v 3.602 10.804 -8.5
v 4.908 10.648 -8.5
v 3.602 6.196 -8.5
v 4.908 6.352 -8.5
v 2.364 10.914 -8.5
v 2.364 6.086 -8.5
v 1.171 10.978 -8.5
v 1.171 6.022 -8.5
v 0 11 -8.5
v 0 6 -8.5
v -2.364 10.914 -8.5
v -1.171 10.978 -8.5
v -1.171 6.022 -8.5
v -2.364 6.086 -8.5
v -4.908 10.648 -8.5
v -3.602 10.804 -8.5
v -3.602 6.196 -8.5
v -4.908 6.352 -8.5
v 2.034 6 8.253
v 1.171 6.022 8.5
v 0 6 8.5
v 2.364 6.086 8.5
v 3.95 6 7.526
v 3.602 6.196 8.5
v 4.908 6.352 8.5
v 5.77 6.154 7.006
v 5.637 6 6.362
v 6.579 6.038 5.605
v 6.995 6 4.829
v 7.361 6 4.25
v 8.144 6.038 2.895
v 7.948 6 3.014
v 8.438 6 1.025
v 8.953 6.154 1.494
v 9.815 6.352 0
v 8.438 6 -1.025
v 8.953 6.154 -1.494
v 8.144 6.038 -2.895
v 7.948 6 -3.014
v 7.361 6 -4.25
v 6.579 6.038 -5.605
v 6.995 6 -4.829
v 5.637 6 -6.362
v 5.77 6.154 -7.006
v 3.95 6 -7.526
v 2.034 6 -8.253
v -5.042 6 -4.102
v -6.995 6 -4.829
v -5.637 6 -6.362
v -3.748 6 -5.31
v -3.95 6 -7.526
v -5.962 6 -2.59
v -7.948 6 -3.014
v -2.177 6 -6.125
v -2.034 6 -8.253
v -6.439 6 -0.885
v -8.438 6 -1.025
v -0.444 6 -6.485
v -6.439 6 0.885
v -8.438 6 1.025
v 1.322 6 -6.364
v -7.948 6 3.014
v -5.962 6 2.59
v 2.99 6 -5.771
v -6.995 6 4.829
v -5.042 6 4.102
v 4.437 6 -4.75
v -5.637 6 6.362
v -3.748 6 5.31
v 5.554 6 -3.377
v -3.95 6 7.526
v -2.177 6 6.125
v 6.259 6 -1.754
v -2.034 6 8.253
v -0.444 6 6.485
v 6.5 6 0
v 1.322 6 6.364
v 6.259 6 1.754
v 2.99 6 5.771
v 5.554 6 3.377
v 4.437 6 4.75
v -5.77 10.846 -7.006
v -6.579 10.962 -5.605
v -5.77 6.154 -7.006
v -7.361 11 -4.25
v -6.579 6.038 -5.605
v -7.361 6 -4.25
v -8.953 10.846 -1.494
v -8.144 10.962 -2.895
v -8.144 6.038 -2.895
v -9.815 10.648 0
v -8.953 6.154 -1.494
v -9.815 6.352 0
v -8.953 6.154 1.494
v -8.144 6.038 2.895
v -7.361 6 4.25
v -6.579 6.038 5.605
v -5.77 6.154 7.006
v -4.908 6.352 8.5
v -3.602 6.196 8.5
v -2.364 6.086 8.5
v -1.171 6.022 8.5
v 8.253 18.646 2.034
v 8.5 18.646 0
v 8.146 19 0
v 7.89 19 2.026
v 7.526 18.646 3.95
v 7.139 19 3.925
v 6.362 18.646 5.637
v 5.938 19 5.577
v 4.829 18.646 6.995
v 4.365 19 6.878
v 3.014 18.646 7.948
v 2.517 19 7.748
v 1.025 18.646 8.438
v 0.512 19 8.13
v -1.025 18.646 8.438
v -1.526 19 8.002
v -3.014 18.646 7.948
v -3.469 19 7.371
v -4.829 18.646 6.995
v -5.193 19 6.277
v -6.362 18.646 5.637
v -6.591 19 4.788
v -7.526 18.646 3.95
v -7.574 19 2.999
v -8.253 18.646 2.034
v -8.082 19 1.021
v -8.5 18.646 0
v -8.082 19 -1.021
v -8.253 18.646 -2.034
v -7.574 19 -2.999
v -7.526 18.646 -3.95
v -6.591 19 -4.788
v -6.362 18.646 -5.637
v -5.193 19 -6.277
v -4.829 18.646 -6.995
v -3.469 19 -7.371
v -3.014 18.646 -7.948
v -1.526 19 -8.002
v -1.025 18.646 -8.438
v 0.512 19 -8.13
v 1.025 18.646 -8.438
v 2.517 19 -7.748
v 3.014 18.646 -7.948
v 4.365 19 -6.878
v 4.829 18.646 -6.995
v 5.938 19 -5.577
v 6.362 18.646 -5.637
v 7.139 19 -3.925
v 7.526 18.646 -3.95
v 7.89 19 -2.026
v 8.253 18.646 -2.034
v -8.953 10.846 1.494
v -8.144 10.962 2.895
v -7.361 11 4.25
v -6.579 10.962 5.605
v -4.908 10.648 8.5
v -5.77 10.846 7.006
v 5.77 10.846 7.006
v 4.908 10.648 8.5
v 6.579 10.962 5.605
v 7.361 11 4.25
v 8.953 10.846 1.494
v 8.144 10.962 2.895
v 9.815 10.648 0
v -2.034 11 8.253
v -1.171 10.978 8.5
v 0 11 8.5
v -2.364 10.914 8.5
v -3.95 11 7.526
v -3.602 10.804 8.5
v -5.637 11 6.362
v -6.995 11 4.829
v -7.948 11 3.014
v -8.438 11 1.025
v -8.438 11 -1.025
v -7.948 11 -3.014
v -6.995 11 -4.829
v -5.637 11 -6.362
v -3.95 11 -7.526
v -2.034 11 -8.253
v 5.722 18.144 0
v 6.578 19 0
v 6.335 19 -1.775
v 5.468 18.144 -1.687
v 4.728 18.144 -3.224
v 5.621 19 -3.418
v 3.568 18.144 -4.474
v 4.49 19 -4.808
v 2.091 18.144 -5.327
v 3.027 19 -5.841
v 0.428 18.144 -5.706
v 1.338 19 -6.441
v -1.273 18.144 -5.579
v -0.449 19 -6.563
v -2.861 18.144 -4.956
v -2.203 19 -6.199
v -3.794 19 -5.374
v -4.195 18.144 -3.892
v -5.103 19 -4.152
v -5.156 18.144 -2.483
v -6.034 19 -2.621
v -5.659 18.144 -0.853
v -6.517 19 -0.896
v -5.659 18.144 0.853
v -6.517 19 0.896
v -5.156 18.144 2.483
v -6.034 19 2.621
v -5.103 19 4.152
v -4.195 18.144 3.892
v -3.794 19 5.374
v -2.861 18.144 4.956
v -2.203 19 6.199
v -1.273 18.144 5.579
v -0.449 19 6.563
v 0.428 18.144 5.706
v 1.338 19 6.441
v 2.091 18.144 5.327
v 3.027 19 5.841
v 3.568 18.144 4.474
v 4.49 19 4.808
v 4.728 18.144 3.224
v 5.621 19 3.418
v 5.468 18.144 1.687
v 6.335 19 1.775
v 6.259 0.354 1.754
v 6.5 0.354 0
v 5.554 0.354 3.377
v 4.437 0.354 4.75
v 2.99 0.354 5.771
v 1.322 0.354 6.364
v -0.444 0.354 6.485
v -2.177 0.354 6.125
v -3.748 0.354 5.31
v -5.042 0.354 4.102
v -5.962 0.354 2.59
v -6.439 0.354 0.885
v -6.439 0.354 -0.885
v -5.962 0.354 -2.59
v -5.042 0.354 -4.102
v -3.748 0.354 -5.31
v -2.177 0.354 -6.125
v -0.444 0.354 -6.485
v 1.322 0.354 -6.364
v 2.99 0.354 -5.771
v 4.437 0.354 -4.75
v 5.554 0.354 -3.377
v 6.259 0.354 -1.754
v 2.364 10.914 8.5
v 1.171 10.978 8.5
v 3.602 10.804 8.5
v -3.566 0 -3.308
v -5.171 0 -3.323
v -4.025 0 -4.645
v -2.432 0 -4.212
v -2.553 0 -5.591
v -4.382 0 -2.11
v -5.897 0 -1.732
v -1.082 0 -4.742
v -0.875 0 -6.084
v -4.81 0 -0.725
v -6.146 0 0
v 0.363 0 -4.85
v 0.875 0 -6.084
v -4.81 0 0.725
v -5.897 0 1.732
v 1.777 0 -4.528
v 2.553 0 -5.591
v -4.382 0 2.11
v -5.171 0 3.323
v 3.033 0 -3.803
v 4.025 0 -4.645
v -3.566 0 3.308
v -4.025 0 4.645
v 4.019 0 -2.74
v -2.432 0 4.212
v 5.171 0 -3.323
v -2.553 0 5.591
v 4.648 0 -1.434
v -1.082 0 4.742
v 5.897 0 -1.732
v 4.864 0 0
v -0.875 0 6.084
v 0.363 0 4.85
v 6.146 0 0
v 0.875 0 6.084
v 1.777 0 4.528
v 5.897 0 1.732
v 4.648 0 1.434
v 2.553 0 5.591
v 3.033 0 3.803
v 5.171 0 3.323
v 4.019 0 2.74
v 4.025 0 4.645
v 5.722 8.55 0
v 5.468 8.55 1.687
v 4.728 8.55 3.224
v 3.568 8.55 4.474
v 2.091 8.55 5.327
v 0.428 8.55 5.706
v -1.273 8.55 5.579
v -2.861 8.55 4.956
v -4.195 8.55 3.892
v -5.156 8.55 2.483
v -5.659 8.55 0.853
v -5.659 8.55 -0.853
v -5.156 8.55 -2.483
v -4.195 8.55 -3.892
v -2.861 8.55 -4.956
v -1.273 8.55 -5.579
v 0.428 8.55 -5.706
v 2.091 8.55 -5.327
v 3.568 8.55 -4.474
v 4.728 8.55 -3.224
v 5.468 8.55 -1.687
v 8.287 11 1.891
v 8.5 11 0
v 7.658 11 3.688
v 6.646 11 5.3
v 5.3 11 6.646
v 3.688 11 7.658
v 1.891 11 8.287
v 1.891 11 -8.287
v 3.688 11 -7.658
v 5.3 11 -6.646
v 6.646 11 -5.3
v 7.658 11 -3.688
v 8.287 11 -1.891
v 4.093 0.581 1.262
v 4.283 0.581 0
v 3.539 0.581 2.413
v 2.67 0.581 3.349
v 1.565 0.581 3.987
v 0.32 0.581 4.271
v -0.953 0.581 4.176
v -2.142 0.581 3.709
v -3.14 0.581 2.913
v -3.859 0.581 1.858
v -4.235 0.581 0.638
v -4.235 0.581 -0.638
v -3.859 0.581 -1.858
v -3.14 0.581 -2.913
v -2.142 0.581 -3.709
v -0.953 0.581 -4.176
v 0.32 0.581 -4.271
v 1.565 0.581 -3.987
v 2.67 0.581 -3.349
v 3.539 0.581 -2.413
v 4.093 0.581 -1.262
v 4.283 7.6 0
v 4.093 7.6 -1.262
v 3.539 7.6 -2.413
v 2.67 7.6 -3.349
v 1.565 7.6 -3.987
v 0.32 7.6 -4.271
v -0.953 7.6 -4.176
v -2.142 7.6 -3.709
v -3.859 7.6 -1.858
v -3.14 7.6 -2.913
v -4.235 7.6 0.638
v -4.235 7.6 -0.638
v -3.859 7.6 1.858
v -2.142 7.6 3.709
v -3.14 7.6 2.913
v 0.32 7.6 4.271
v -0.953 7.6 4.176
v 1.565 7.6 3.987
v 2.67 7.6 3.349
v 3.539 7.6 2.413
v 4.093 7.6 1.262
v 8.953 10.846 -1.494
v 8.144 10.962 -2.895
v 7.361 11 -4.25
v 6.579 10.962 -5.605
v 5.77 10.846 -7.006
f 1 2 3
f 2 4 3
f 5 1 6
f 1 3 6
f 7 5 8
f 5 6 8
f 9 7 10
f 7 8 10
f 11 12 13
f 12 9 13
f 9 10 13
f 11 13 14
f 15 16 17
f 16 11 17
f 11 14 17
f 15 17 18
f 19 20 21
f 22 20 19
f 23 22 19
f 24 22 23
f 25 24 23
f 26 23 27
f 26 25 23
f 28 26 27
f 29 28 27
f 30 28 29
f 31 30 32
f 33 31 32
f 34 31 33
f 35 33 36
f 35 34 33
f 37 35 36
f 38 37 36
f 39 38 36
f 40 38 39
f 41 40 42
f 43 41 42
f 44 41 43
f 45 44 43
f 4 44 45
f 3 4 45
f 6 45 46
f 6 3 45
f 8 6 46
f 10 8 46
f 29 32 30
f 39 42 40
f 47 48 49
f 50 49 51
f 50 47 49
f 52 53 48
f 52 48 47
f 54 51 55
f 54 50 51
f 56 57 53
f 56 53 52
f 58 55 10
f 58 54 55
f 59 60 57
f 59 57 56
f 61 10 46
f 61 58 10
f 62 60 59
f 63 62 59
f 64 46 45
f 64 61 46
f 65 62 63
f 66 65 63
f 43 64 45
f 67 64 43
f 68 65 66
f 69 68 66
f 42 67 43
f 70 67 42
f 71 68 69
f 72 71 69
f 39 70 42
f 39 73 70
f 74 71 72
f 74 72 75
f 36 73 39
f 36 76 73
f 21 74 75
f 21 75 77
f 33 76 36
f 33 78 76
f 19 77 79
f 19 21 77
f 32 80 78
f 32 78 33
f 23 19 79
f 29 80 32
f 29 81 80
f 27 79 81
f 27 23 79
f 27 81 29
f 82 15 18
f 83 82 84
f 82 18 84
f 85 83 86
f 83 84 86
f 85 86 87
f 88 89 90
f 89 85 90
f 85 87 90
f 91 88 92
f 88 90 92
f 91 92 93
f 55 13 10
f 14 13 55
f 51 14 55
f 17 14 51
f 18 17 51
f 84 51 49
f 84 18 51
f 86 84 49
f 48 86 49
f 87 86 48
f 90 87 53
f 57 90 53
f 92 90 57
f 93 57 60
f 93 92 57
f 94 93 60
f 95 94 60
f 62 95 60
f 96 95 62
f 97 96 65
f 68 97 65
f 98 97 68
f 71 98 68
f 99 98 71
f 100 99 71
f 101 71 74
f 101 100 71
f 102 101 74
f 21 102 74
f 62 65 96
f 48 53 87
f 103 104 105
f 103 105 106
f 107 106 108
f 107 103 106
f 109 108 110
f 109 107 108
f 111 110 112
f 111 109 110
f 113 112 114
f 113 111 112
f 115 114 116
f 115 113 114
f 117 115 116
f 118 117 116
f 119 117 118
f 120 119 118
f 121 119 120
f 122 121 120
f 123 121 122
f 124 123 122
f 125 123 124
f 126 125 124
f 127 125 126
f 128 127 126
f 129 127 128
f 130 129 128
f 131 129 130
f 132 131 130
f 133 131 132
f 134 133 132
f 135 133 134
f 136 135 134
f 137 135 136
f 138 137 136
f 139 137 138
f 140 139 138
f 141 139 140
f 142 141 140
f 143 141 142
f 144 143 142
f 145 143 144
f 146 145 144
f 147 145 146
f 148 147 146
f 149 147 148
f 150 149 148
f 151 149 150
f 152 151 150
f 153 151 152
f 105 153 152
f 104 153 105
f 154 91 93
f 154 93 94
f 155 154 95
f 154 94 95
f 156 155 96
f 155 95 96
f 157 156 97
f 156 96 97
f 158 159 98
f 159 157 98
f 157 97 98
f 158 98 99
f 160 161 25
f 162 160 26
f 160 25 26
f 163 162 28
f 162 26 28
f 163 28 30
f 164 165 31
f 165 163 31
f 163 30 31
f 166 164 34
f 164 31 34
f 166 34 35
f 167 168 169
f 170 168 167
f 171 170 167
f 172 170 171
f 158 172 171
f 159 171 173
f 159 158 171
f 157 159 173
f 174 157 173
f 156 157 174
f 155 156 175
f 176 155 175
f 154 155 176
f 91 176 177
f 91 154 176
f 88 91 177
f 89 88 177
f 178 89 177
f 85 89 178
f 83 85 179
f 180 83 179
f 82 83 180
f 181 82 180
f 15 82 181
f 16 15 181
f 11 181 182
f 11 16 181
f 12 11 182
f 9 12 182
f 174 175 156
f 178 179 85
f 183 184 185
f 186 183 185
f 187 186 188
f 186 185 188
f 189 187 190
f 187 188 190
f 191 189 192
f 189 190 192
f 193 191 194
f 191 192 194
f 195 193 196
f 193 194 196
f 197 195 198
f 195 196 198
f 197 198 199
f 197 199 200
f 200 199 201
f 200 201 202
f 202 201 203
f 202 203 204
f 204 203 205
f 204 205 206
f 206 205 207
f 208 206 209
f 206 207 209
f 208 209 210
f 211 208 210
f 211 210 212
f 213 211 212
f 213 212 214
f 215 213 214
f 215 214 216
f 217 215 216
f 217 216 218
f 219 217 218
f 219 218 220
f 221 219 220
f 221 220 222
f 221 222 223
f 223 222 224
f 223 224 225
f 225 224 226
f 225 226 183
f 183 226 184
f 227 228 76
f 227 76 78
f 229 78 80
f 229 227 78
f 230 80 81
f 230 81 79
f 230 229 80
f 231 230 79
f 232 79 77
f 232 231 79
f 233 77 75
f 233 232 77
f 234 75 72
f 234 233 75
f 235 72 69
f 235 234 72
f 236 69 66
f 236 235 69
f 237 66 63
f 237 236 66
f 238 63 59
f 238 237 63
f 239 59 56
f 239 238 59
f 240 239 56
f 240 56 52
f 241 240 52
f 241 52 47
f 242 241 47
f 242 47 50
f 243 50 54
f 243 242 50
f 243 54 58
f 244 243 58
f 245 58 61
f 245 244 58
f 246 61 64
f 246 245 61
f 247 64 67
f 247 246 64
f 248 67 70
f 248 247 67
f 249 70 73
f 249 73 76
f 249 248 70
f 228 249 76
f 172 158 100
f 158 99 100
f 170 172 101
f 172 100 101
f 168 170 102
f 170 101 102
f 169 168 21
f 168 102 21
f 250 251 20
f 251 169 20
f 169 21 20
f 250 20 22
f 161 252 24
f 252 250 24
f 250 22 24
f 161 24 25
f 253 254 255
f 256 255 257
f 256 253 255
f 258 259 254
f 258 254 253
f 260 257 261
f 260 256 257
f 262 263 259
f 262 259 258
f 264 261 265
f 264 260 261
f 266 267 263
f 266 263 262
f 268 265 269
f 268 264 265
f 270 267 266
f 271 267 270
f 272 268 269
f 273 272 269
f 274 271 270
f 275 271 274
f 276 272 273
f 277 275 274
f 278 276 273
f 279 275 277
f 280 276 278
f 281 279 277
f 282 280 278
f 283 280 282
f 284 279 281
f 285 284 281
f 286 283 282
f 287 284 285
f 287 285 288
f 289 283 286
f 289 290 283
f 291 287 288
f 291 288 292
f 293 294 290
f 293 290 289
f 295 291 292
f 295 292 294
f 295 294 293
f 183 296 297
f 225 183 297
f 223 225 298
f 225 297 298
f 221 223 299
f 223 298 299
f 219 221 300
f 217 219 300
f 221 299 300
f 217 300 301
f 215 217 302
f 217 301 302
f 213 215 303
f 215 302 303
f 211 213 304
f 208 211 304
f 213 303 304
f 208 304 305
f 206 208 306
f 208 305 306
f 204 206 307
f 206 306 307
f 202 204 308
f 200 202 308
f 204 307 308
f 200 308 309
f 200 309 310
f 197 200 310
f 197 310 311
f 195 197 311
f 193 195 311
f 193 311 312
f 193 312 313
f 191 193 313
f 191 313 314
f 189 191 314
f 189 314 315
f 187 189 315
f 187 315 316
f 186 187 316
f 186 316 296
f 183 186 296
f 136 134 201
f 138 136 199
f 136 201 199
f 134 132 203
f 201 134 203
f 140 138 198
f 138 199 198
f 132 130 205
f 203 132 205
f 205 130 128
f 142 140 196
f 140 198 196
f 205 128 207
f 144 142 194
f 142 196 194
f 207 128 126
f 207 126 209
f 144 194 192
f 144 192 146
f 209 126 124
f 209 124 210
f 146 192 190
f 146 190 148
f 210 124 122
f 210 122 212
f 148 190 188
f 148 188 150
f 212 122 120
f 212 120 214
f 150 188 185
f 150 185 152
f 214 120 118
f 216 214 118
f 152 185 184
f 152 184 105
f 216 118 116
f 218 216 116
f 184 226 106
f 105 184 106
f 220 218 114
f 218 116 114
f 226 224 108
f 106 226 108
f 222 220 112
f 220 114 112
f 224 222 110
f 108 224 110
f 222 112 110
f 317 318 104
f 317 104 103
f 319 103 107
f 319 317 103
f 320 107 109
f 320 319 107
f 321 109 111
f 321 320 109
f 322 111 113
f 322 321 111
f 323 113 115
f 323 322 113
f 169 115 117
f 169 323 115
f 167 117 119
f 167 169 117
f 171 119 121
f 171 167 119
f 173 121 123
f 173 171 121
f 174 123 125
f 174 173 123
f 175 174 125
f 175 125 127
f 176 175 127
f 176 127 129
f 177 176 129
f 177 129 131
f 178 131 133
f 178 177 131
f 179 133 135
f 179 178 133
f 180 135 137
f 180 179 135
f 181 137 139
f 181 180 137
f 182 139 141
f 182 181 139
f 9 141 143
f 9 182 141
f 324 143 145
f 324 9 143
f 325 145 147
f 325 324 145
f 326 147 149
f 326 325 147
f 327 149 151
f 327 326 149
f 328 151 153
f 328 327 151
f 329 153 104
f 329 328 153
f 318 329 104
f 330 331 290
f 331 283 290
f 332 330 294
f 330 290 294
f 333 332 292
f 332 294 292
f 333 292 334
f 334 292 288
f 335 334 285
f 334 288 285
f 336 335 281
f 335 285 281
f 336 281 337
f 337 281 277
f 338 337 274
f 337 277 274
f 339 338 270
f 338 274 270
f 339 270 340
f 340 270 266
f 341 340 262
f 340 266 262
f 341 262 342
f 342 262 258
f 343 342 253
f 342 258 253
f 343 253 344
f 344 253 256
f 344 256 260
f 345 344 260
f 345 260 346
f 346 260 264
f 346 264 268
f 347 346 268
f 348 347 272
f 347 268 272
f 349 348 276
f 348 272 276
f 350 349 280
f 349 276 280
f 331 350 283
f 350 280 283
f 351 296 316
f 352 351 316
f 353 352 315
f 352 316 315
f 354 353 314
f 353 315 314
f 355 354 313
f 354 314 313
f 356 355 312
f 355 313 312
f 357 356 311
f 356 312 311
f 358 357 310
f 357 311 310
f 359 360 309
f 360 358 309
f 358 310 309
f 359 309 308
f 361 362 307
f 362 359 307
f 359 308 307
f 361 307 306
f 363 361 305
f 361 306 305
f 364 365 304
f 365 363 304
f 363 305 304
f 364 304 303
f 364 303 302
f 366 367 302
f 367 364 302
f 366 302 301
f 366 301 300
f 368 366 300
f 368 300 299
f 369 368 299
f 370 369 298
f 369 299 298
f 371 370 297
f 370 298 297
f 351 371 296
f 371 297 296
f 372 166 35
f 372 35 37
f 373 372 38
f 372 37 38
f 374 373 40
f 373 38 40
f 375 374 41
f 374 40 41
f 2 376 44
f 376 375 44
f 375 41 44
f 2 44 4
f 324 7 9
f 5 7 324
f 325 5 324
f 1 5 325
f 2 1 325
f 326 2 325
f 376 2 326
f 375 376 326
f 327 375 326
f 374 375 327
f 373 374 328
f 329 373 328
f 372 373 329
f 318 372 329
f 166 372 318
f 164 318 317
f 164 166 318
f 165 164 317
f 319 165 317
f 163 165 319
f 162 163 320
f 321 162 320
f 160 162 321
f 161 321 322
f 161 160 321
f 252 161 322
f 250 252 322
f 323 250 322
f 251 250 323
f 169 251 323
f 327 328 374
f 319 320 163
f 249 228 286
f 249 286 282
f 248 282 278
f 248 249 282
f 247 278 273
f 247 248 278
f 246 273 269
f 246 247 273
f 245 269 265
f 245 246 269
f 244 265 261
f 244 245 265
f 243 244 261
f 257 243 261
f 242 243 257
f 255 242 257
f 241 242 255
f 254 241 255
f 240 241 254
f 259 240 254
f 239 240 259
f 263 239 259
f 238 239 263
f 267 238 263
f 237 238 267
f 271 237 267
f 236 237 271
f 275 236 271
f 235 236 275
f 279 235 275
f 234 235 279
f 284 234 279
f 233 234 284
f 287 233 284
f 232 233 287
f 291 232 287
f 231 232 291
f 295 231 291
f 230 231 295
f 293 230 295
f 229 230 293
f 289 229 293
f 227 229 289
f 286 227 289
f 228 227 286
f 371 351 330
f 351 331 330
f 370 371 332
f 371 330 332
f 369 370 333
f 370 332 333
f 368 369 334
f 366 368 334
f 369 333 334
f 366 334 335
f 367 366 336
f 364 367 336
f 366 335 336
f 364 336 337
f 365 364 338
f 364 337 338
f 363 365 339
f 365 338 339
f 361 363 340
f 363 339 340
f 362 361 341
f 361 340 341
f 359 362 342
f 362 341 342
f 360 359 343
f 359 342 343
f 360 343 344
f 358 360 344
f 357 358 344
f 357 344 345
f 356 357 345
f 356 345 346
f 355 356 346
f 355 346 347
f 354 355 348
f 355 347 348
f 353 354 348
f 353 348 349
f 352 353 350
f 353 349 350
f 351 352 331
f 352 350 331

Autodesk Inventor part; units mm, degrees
sketch "Sketch_12" plane through (0, 0, 0) normal (0, 0, 1) x (1, 0, 0)
  line L0 (0, 0) -> (0, 19)
  line L1 (0, 19) -> (8.1464, 19)
  line L2 (8.1464, 19) -> (8.5, 18.6464)
  line L3 (8.5, 18.6464) -> (8.5, 11)
  line L4 (8.5, 11) -> (10.2, 10.5445)
  line L5 (10.2, 10.5445) -> (10.2, 6.4555)
  line L6 (10.2, 6.4555) -> (8.5, 6)
  line L7 (8.5, 6) -> (6.5, 6)
  line L8 (6.5, 6) -> (6.5, 0.3536)
  line L9 (6.5, 0.3536) -> (6.1464, 0)
  line L10 (6.1464, 0) -> (0, 0)
  line L11 (0, 0) -> (0, 19)
revolve "Revolution1" add sketch "Sketch_12" angle 360 about axis through (0, 0, 0) along (0, -1, 0)
sketch "Sketch_13" plane through (0, 0, 0) normal (0, 1, 0) x (-1, 0, 0)
  line L0 (17, 17) -> (-17, 17)
  line L1 (-17, 17) -> (-17, -17)
  line L2 (-17, -17) -> (17, -17)
  line L3 (17, -17) -> (17, 17)
  line L4 (9.815, 0) -> (4.9075, 8.5)
  line L5 (4.9075, 8.5) -> (-4.9075, 8.5)
  line L6 (-4.9075, 8.5) -> (-9.815, 0)
  line L7 (-9.815, 0) -> (-4.9075, -8.5)
  line L8 (-4.9075, -8.5) -> (4.9075, -8.5)
  line L9 (4.9075, -8.5) -> (9.815, 0)
extrude "Extrusion1" cut sketch "Sketch_13" along normal blind 13.3
sketch "Sketch_14" plane through (0, 0, 0) normal (0, 0, 1) x (1, 0, 0)
  line L0 (0, 0) -> (0, 19)
  line L1 (0, 19) -> (6.5785, 19)
  line L2 (6.5785, 19) -> (5.7225, 18.144)
  line L3 (5.7225, 18.144) -> (5.7225, 8.55)
  line L4 (5.7225, 8.55) -> (4.283, 7.6)
  line L5 (4.283, 7.6) -> (4.283, 0.581)
  line L6 (4.283, 0.581) -> (4.864, 0)
  line L7 (4.864, 0) -> (0, 0)
  line L8 (0, 0) -> (0, 19)
revolve "Revolution2" cut sketch "Sketch_14" angle 360 about axis through (0, 0, 0) along (0, -1, 0)
thread "Thread1" size "G13.157x1.337" designation "G 1/4" standard "ISO Pipe Threads" length 8.644
thread "Thread2" size "G9.728x0.907" designation "G 1/8" standard "ISO Pipe Threads" full length
ref_plane "ANBAU_XY" through (0, 7.5, 0) normal (0, 1, 0) x (1, 0, 0)
ref_plane "ANBAU_YZ" through (0, 7.5, 0) normal (1, 0, 0) x (0, 0, -1)
ref_plane "ANBAU_ZX" through (0, 7.5, 0) normal (0, 0, -1) x (0, 1, 0)
ref_plane "DICHTRING_XY" through (0, 9.5, 0) normal (0, 1, 0) x (1, 0, 0)
ref_plane "DICHTRING_YZ" through (0, 9.5, 0) normal (1, 0, 0) x (0, 0, -1)
ref_plane "DICHTRING_ZX" through (0, 9.5, 0) normal (0, 0, -1) x (0, 1, 0)
ref_plane "IP1_XY" through (0, 19, 0) normal (0, -1, 0) x (1, 0, 0)
ref_plane "IP1_YZ" through (0, 19, 0) normal (1, 0, 0) x (0, 0, 1)
ref_plane "IP1_ZX" through (0, 19, 0) normal (0, 0, 1) x (0, -1, 0)
ref_plane "IP2_XY" through (0, 9.5, 0) normal (0, 1, 0) x (1, 0, 0)
ref_plane "IP2_YZ" through (0, 9.5, 0) normal (1, 0, 0) x (0, 0, -1)
ref_plane "IP2_ZX" through (0, 9.5, 0) normal (0, 0, -1) x (0, 1, 0)
properties part number "8069220 NPFC-R-G14-G18-F"
